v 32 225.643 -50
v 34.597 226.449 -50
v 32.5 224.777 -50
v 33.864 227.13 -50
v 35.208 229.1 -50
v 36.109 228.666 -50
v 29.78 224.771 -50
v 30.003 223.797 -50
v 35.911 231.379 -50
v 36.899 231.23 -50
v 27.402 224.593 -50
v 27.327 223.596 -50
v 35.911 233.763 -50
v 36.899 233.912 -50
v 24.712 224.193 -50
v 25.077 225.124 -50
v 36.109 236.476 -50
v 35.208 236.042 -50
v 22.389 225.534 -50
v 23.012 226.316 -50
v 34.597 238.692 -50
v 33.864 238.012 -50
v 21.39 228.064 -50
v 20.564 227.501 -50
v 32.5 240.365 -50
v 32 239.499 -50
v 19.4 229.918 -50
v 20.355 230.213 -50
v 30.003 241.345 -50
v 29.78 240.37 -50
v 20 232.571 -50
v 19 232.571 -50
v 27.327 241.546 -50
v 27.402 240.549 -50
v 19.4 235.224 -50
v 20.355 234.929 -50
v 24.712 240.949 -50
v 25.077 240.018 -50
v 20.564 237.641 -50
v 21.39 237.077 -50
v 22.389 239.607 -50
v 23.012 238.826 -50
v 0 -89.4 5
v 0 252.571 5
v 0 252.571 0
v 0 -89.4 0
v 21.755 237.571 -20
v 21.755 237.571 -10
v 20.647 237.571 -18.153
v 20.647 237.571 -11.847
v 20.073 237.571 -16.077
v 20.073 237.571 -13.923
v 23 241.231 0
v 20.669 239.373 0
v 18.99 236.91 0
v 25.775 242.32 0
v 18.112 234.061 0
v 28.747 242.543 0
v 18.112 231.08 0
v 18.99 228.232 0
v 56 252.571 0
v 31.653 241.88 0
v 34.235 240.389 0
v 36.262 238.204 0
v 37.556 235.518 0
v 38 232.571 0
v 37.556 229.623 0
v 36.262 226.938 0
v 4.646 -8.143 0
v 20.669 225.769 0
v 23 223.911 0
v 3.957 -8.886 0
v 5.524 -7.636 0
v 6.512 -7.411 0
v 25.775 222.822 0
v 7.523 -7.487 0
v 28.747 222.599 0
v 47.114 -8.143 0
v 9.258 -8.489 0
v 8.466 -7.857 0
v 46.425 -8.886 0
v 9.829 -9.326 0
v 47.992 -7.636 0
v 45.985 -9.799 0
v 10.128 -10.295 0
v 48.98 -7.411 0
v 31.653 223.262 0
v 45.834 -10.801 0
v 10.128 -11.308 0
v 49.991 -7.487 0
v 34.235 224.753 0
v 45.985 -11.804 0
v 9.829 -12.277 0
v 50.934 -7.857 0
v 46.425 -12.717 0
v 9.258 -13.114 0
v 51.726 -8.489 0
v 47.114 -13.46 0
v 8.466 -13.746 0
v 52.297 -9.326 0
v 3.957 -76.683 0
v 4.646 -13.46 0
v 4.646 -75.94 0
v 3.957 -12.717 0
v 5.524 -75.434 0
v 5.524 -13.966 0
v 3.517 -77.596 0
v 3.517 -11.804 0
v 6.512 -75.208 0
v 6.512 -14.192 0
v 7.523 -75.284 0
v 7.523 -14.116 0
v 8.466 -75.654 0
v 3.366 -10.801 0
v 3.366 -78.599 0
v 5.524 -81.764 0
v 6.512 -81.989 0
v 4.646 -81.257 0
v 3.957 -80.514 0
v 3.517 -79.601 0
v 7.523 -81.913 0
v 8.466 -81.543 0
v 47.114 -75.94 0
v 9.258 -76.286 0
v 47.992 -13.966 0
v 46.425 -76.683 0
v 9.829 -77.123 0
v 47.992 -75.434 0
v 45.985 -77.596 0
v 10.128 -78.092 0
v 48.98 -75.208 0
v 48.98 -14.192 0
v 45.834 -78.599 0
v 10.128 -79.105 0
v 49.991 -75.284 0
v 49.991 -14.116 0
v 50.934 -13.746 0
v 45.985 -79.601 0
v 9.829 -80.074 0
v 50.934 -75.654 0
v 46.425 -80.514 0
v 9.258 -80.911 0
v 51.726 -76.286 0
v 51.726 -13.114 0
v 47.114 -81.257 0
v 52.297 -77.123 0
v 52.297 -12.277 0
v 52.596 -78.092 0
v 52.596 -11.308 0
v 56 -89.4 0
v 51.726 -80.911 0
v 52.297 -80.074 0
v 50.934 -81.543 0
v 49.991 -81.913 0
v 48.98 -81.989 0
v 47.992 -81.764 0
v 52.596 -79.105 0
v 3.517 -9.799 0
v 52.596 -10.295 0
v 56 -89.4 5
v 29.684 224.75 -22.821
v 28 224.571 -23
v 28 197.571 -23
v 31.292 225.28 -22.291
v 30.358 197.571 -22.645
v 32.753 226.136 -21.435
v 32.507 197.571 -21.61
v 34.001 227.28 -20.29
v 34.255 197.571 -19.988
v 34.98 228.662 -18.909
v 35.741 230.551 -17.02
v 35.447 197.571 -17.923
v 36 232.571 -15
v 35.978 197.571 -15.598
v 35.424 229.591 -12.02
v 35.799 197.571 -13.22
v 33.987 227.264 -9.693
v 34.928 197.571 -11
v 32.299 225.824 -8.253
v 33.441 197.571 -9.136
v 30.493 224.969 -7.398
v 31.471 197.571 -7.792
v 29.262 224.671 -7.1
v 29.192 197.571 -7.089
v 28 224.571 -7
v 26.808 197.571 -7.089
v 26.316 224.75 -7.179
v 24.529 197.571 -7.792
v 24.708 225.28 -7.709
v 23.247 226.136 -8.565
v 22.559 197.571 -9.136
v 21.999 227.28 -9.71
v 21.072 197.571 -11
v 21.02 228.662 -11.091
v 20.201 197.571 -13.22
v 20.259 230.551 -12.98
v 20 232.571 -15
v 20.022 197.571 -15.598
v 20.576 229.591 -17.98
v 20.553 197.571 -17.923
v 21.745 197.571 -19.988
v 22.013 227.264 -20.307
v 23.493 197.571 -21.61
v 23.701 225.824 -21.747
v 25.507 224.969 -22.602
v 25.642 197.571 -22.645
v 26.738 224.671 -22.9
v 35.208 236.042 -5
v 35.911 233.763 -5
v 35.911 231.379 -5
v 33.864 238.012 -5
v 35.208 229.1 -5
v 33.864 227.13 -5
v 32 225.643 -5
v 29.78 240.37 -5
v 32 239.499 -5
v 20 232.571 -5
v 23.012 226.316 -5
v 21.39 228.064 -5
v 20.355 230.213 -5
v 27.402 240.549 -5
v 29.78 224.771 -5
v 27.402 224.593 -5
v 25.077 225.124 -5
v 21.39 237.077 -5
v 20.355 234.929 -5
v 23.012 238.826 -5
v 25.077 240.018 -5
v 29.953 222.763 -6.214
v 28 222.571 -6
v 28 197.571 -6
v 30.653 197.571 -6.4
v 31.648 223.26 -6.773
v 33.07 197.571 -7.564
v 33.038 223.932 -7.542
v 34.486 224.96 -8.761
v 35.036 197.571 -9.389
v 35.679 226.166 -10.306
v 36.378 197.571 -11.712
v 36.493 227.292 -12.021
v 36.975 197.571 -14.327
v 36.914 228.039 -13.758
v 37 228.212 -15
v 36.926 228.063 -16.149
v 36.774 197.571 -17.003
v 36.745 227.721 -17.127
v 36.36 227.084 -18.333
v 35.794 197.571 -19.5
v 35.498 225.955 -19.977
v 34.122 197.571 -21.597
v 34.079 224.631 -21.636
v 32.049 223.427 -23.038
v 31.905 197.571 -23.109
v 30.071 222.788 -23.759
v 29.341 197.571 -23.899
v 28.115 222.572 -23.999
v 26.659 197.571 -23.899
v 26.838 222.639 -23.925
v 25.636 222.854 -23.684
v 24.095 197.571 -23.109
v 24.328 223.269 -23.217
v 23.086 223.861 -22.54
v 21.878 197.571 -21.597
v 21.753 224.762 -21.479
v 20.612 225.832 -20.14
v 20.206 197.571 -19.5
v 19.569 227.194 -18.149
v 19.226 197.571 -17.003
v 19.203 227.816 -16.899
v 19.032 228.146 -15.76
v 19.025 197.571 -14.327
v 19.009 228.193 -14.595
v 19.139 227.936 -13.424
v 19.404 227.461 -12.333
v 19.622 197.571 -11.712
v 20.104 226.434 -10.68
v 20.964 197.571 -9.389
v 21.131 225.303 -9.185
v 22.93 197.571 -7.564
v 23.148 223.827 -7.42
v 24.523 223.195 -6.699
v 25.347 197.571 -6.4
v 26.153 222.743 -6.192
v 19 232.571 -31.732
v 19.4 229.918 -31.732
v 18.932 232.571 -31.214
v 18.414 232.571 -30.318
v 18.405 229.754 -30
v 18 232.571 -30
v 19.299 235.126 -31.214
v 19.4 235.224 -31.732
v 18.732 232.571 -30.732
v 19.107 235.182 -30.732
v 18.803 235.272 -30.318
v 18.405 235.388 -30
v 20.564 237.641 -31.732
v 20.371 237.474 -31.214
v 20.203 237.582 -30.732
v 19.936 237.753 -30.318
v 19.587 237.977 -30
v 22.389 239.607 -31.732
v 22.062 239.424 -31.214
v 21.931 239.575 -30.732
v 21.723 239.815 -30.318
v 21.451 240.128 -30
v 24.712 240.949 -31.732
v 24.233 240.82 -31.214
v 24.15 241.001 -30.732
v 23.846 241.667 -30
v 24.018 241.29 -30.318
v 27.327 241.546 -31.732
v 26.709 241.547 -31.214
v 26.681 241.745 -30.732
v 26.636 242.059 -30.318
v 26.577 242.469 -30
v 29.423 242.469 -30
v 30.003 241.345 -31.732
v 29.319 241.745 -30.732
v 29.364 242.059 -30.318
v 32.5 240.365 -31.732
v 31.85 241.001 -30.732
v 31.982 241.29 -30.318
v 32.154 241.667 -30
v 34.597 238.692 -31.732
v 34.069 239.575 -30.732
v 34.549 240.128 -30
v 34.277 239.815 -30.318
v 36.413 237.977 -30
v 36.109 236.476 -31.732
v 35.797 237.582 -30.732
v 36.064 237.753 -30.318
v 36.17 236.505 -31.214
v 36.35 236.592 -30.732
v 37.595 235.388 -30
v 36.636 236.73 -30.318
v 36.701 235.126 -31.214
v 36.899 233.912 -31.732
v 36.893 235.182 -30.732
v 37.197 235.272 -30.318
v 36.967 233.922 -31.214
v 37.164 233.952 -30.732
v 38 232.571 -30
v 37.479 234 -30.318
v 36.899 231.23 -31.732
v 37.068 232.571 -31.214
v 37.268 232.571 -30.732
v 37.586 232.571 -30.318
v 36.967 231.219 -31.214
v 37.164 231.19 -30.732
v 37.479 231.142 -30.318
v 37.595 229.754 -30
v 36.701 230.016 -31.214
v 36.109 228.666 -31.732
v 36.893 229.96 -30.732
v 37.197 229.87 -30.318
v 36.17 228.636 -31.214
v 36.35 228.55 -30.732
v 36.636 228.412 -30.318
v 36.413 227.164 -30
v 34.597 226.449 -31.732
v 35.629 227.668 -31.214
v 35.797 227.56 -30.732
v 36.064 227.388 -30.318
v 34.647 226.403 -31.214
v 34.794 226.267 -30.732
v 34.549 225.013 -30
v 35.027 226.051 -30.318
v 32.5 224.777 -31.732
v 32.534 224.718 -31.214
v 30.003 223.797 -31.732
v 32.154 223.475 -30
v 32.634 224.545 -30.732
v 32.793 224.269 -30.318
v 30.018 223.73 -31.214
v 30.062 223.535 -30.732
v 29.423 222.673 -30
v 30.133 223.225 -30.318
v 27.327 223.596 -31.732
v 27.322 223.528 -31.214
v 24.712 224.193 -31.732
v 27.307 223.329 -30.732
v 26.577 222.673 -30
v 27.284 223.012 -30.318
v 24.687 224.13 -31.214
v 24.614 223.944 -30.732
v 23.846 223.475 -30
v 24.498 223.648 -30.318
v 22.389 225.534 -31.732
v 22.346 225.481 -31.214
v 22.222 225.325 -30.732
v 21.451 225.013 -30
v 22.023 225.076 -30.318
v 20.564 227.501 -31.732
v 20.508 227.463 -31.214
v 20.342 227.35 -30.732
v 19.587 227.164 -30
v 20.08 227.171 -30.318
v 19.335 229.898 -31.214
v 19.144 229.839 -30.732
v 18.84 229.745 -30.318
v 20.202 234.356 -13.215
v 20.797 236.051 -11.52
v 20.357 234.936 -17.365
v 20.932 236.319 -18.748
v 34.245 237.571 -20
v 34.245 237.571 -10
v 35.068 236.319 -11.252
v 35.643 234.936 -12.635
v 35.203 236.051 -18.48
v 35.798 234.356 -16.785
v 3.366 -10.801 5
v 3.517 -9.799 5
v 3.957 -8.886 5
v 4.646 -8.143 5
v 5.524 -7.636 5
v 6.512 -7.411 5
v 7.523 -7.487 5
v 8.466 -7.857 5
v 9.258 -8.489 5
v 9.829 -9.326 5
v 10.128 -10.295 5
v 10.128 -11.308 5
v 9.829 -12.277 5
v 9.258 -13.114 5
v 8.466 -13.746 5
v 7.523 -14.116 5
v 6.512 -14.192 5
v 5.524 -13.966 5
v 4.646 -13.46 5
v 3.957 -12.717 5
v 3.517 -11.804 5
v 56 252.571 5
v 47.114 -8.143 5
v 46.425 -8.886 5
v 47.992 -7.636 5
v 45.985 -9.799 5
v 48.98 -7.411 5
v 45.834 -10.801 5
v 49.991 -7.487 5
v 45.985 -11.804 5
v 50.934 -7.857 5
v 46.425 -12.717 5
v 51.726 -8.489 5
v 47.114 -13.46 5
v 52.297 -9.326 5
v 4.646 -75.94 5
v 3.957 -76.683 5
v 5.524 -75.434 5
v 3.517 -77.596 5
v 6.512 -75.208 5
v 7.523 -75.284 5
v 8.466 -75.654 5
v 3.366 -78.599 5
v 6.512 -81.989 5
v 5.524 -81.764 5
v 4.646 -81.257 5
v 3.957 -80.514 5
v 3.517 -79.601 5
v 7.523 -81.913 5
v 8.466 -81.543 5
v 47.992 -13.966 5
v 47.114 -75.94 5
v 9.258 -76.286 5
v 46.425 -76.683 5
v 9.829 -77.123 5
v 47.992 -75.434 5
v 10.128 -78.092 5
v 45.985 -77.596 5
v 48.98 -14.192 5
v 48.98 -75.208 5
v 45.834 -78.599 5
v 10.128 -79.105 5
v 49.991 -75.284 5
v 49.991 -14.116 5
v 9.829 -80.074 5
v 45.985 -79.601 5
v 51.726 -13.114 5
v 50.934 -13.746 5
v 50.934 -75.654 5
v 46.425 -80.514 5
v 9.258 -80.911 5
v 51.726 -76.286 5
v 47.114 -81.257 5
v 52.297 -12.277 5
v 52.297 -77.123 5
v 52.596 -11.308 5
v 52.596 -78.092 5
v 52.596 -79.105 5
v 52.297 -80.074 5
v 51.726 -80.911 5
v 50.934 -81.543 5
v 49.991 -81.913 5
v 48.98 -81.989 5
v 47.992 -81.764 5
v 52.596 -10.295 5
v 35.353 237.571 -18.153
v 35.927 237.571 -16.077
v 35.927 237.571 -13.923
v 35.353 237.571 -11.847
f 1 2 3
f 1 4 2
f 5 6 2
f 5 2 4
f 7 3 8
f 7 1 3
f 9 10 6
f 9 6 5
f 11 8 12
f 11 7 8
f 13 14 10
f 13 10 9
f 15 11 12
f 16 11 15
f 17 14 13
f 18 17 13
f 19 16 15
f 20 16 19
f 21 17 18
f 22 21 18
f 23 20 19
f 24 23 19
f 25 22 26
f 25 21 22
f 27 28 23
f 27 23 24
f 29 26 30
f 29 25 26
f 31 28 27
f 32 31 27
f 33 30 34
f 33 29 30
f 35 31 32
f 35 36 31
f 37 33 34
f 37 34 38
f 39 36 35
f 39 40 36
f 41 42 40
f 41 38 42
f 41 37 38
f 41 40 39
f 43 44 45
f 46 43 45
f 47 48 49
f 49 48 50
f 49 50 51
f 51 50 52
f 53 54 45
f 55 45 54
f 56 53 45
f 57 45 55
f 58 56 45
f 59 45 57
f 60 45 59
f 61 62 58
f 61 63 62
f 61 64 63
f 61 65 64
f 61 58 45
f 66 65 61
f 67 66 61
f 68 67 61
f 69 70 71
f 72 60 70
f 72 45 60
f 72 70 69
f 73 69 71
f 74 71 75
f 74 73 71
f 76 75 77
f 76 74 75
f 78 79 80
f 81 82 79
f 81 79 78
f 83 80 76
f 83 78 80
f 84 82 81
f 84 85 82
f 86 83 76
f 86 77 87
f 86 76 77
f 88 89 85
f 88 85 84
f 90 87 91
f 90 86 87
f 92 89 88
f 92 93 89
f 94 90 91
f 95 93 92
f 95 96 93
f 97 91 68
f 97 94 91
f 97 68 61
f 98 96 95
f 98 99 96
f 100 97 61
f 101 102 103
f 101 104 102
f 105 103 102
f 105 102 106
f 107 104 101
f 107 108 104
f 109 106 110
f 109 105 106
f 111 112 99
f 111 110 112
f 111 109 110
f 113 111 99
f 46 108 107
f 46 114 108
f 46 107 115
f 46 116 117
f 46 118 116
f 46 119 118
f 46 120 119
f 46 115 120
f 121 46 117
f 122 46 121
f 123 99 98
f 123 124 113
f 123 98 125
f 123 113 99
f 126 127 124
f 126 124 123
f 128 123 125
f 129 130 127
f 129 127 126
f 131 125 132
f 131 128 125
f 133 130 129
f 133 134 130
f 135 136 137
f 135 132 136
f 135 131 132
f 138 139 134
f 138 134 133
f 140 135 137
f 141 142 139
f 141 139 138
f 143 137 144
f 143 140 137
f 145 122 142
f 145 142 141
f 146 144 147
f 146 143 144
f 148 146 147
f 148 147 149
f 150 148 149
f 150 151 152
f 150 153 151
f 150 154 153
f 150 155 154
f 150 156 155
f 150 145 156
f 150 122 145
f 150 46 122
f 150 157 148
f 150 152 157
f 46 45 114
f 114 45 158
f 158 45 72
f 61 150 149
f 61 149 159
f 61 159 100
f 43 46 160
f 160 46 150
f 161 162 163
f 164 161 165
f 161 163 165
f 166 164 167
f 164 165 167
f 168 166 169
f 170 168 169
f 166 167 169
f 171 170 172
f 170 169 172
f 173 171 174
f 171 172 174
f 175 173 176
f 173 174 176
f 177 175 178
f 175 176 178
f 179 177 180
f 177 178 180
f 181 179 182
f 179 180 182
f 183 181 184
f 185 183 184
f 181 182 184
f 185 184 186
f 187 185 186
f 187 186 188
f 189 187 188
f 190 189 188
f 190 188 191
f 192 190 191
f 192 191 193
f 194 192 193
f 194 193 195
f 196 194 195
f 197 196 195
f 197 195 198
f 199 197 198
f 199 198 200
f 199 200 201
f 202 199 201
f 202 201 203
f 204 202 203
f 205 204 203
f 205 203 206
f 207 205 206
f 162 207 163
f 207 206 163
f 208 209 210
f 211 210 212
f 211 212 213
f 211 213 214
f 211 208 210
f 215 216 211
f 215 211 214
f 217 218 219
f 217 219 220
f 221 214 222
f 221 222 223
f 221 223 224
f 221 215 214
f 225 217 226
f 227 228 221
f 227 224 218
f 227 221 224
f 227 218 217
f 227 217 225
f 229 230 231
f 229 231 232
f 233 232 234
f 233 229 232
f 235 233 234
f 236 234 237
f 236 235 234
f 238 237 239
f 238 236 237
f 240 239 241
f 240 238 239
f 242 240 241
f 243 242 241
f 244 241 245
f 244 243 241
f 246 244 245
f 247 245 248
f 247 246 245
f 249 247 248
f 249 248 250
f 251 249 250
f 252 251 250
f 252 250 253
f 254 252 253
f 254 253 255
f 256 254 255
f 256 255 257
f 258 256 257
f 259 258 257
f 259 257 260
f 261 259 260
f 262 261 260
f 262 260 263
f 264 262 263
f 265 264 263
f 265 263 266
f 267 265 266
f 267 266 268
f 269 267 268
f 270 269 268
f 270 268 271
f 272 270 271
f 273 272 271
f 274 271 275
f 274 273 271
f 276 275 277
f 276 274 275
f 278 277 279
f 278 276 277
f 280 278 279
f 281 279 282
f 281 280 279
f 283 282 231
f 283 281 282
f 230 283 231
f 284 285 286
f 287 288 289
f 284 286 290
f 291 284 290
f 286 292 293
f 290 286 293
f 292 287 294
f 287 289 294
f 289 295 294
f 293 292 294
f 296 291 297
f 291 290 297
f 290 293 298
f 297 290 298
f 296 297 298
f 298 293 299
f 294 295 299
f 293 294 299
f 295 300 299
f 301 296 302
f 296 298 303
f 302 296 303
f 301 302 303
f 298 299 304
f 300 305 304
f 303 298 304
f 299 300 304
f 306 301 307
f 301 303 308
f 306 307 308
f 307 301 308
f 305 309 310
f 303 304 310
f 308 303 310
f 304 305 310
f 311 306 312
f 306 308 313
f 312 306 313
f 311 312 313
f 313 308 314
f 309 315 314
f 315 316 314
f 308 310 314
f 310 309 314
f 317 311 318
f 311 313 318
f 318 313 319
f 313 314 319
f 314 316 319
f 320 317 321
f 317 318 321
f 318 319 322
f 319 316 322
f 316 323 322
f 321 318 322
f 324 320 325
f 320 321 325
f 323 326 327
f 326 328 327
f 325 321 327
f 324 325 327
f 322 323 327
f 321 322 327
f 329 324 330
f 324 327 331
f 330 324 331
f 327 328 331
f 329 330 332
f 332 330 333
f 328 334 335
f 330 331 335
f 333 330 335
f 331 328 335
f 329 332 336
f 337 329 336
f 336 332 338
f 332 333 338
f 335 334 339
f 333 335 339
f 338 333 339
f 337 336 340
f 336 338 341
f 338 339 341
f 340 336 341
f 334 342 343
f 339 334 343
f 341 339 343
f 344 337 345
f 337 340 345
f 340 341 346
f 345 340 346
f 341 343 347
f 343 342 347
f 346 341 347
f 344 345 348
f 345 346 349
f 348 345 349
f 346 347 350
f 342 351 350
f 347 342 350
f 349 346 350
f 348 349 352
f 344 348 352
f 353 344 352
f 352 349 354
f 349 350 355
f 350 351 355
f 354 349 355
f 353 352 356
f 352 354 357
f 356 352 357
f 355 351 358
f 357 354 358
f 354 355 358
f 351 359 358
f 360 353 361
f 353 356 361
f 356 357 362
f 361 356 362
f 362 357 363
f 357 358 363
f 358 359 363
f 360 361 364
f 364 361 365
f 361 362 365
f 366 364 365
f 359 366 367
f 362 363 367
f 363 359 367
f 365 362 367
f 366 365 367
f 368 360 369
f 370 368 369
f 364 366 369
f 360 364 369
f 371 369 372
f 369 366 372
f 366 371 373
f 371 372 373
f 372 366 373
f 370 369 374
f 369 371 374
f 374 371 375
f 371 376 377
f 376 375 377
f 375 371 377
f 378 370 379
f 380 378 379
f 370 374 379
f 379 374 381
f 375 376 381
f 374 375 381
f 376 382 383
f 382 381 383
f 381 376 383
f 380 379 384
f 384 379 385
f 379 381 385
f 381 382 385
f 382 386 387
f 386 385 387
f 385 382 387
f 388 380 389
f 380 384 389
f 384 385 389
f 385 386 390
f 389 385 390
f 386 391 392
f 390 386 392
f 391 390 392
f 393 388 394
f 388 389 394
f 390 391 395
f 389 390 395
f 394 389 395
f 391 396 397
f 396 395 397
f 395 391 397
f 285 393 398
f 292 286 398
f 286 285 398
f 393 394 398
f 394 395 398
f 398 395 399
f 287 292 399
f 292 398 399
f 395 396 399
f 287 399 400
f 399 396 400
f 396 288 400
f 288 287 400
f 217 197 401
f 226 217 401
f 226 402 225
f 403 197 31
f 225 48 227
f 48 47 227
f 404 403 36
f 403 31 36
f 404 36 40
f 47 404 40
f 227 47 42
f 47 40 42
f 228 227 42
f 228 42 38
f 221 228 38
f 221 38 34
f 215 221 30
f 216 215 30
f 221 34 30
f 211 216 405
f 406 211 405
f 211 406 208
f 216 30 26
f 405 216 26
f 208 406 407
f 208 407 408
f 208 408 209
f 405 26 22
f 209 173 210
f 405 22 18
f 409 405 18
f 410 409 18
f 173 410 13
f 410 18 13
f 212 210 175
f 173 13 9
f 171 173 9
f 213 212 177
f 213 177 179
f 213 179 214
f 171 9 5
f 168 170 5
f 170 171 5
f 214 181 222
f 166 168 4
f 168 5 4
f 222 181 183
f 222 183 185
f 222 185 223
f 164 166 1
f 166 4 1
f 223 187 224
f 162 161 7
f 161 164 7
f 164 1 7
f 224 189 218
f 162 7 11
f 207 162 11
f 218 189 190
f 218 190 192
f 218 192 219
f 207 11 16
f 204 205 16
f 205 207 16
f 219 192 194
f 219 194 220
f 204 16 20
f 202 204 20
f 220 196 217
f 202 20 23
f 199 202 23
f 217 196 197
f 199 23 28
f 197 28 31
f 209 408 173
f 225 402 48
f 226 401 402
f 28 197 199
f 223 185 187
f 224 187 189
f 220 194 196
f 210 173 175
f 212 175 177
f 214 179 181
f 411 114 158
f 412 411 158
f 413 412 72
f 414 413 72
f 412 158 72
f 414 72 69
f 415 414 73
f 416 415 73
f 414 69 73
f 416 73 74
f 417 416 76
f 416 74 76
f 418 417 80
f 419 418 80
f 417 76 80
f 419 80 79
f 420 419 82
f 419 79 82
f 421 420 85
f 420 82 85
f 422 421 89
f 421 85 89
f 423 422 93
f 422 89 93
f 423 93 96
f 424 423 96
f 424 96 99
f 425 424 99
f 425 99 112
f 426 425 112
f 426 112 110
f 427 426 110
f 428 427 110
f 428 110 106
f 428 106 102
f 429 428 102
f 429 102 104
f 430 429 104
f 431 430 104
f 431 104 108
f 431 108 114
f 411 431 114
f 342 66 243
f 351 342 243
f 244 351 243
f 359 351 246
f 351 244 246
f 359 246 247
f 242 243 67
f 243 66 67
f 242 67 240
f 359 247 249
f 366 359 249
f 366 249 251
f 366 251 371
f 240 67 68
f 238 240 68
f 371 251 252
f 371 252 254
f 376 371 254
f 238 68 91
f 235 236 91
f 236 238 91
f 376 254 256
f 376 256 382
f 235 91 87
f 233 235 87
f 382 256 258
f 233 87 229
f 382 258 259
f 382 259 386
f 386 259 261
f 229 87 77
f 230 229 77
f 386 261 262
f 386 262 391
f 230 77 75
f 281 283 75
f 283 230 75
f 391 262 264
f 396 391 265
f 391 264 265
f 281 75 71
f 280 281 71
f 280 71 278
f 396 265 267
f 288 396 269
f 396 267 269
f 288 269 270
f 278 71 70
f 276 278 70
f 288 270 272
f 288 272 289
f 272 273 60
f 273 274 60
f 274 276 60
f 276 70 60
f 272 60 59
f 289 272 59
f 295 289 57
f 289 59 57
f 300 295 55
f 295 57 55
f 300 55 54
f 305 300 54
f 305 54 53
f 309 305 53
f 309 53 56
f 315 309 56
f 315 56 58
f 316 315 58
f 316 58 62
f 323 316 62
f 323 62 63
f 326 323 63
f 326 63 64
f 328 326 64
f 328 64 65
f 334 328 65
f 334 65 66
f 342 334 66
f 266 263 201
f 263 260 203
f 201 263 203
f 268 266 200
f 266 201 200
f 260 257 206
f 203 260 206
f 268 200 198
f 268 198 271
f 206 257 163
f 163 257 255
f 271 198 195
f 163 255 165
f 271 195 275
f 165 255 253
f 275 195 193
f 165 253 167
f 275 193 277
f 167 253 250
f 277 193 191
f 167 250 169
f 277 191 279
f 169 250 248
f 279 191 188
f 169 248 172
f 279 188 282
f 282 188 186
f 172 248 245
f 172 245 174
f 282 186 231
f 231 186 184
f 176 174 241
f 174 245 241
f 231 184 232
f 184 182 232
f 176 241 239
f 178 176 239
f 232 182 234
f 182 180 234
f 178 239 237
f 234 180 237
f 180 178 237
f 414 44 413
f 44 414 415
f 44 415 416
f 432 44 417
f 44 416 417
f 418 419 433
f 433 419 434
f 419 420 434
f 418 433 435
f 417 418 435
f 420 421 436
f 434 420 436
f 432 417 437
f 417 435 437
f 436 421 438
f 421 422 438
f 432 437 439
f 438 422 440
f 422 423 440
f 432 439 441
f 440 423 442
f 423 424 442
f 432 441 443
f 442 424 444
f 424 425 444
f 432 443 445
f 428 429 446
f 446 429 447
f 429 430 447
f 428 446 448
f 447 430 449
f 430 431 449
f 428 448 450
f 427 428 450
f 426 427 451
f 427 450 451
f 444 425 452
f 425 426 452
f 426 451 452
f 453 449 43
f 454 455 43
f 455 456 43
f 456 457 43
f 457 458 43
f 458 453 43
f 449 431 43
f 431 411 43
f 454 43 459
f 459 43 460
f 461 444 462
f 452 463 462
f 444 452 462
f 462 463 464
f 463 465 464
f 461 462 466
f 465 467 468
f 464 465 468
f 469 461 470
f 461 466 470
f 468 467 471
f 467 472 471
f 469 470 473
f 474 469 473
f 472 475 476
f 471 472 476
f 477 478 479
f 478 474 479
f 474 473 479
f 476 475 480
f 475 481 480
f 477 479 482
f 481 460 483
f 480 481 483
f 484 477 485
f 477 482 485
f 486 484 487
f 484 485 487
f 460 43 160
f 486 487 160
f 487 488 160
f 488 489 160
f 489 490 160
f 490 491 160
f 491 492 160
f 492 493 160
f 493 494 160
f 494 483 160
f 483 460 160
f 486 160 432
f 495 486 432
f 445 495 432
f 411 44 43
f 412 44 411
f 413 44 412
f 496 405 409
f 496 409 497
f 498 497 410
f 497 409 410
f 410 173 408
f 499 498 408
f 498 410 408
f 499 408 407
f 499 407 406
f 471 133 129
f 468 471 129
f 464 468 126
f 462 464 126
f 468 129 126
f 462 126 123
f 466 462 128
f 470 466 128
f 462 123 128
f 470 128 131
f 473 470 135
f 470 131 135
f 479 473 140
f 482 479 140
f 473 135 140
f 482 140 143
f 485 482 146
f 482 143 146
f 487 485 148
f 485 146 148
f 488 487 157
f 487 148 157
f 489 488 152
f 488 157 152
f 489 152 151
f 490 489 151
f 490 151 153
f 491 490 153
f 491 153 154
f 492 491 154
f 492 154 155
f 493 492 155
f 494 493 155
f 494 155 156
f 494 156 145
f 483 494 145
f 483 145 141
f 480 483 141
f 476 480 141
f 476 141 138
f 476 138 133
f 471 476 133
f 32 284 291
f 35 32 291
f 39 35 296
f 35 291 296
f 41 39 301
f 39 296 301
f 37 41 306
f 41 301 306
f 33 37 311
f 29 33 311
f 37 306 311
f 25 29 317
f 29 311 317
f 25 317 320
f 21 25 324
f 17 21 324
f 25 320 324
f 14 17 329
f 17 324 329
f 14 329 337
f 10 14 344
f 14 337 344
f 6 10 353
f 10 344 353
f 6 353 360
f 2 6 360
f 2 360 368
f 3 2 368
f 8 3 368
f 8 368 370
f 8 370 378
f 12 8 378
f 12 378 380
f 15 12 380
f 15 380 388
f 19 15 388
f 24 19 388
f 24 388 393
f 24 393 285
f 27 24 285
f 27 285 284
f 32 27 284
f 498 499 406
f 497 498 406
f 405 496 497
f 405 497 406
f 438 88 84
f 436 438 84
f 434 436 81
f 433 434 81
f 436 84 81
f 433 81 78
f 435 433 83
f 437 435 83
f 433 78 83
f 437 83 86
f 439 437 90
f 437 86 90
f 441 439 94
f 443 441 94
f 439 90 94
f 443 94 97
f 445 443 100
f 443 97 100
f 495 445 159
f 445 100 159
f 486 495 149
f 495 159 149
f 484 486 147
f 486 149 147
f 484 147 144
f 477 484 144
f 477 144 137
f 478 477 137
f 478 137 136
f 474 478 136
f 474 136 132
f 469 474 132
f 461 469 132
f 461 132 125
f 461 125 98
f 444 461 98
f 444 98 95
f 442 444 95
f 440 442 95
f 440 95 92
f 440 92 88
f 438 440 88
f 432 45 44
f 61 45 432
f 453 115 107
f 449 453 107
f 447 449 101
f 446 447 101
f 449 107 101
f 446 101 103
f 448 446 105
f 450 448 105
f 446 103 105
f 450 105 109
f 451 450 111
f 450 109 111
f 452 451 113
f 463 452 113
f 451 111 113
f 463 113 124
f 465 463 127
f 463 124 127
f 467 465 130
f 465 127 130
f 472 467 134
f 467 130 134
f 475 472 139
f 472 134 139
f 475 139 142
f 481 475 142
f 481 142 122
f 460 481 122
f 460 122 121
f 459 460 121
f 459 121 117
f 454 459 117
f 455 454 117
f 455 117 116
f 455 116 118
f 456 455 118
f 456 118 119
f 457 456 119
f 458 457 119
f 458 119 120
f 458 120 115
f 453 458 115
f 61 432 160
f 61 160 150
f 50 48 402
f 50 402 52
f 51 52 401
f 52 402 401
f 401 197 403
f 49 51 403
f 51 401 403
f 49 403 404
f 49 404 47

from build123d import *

# Parameters (mm, degrees)
SKETCH_1_W             = 56
SKETCH_1_H             = 89.4
EXTRUDE_1_DEPTH        = 5
HOLE_WIZARD_M8_2_D     = 6.8
HOLE_WIZARD_M8_2_DEPTH = 19.75
HOLE_WIZARD_M8_2_TIP   = 2.042926105
SKETCH_7_W             = 56
SKETCH_7_H             = 5
EXTRUDE_2_DEPTH        = 252.5709
SKETCH_8_R             = 10
EXTRUDE_3_DEPTH        = 30
SKETCH_9_R             = 9
EXTRUDE_4_DEPTH        = 20
FILLET_1_R             = 2
EXTRUDE_START          = -20
SKETCH_10_R            = 9
EXTRUDE_5_DEPTH        = 35
SKETCH_11_R            = 8
CUT_EXTRUDE_1_DEPTH    = 40
SKETCH_12_R            = 8
CUT_EXTRUDE_2_DEPTH    = 45


with BuildPart() as part:
    # 草图1 → 凸台-拉伸1 (new body)
    with BuildSketch(Plane.XY):
        with Locations((28, -44.7)):
            Rectangle(SKETCH_1_W, SKETCH_1_H)
    extrude(amount=EXTRUDE_1_DEPTH)

    # M8 螺纹孔2
    with Locations(Plane.XY.offset(5)):
        with Locations((49.234030414, -78.598612839), (49.234030414, -10.801387161), (6.765969586, -10.801387161), (6.765969586, -78.598612839)):
            Hole(HOLE_WIZARD_M8_2_D / 2, depth=HOLE_WIZARD_M8_2_DEPTH)
            with Locations((0, 0, -(HOLE_WIZARD_M8_2_DEPTH + HOLE_WIZARD_M8_2_TIP / 2))):  # 118° drill point
                Cone(0, HOLE_WIZARD_M8_2_D / 2, HOLE_WIZARD_M8_2_TIP, mode=Mode.SUBTRACT)

    # 草图7 → 凸台-拉伸2 (add)
    with BuildSketch(Plane(origin=(0, 0, 0), x_dir=(1, 0, 0), z_dir=(0, 1, 0))):
        with Locations((28, -2.5)):
            Rectangle(SKETCH_7_W, SKETCH_7_H)
    extrude(amount=EXTRUDE_2_DEPTH)

    # 草图8 → 凸台-拉伸3 (add)
    with BuildSketch(Plane(origin=(0, 0, 0), x_dir=(-1, 0, 0), z_dir=(0, 0, -1))):
        with Locations(Location((-28, 232.5709, 0), (0, 0, 180))):
            Circle(SKETCH_8_R)
    extrude(amount=EXTRUDE_3_DEPTH)

    # 草图9 → 凸台-拉伸4 (add)
    with BuildSketch(Plane(origin=(0, 0, -30), x_dir=(-1, 0, 0), z_dir=(0, 0, -1))):
        with Locations((-28, 232.5709)):
            Circle(SKETCH_9_R)
    extrude(amount=EXTRUDE_4_DEPTH)

    # 圆角1
    # the kernel refuses this fillet: 2 mm, written as the material it adds along each edge
    with BuildSketch(Plane(origin=(28, 232.5709, -30), x_dir=(-1, 0, 0), z_dir=(0, -1, 0))) as fillet_1_piece_1:
        with BuildLine():
            CenterArc((11, 1.732050808), FILLET_1_R, 180, 60)
            Line((9, 1.732050808), (8.96, 1.732050808))
            Line((8.96, 1.732050808), (8.96, 0))
            Line((8.96, 0), (9, -0.04))
            ThreePointArc((9, -0.04), (9.5, -0.04), (9.98, -0.034641016))
            Line((9.98, -0.034641016), (10, 0))
        make_face()
    revolve(axis=Axis((28, 232.5709, -30), (0, 0, -1)))

    # 草图10 → 凸台-拉伸5 (add)
    with BuildSketch(Plane(origin=(0, 252.5709, 0), x_dir=(1, 0, 0), z_dir=(0, 1, 0)).offset(EXTRUDE_START)):
        with Locations(Location((28, 15, 0), (0, 0, 270))):
            Circle(SKETCH_10_R)
    extrude(amount=-EXTRUDE_5_DEPTH)

    # 草图11 → 切除-拉伸1 (cut)
    with BuildSketch(Plane.XZ.offset(-197.5709)):
        with Locations(Location((28, -15, 0), (0, 0, 270))):
            Circle(SKETCH_11_R)
    extrude(amount=-CUT_EXTRUDE_1_DEPTH, mode=Mode.SUBTRACT)

    # 草图12 → 切除-拉伸2 (cut)
    with BuildSketch(Plane(origin=(0, 0, -50), x_dir=(-1, 0, 0), z_dir=(0, 0, -1))):
        with Locations((-28, 232.5709)):
            Circle(SKETCH_12_R)
    extrude(amount=-CUT_EXTRUDE_2_DEPTH, mode=Mode.SUBTRACT)


solid = part.part
